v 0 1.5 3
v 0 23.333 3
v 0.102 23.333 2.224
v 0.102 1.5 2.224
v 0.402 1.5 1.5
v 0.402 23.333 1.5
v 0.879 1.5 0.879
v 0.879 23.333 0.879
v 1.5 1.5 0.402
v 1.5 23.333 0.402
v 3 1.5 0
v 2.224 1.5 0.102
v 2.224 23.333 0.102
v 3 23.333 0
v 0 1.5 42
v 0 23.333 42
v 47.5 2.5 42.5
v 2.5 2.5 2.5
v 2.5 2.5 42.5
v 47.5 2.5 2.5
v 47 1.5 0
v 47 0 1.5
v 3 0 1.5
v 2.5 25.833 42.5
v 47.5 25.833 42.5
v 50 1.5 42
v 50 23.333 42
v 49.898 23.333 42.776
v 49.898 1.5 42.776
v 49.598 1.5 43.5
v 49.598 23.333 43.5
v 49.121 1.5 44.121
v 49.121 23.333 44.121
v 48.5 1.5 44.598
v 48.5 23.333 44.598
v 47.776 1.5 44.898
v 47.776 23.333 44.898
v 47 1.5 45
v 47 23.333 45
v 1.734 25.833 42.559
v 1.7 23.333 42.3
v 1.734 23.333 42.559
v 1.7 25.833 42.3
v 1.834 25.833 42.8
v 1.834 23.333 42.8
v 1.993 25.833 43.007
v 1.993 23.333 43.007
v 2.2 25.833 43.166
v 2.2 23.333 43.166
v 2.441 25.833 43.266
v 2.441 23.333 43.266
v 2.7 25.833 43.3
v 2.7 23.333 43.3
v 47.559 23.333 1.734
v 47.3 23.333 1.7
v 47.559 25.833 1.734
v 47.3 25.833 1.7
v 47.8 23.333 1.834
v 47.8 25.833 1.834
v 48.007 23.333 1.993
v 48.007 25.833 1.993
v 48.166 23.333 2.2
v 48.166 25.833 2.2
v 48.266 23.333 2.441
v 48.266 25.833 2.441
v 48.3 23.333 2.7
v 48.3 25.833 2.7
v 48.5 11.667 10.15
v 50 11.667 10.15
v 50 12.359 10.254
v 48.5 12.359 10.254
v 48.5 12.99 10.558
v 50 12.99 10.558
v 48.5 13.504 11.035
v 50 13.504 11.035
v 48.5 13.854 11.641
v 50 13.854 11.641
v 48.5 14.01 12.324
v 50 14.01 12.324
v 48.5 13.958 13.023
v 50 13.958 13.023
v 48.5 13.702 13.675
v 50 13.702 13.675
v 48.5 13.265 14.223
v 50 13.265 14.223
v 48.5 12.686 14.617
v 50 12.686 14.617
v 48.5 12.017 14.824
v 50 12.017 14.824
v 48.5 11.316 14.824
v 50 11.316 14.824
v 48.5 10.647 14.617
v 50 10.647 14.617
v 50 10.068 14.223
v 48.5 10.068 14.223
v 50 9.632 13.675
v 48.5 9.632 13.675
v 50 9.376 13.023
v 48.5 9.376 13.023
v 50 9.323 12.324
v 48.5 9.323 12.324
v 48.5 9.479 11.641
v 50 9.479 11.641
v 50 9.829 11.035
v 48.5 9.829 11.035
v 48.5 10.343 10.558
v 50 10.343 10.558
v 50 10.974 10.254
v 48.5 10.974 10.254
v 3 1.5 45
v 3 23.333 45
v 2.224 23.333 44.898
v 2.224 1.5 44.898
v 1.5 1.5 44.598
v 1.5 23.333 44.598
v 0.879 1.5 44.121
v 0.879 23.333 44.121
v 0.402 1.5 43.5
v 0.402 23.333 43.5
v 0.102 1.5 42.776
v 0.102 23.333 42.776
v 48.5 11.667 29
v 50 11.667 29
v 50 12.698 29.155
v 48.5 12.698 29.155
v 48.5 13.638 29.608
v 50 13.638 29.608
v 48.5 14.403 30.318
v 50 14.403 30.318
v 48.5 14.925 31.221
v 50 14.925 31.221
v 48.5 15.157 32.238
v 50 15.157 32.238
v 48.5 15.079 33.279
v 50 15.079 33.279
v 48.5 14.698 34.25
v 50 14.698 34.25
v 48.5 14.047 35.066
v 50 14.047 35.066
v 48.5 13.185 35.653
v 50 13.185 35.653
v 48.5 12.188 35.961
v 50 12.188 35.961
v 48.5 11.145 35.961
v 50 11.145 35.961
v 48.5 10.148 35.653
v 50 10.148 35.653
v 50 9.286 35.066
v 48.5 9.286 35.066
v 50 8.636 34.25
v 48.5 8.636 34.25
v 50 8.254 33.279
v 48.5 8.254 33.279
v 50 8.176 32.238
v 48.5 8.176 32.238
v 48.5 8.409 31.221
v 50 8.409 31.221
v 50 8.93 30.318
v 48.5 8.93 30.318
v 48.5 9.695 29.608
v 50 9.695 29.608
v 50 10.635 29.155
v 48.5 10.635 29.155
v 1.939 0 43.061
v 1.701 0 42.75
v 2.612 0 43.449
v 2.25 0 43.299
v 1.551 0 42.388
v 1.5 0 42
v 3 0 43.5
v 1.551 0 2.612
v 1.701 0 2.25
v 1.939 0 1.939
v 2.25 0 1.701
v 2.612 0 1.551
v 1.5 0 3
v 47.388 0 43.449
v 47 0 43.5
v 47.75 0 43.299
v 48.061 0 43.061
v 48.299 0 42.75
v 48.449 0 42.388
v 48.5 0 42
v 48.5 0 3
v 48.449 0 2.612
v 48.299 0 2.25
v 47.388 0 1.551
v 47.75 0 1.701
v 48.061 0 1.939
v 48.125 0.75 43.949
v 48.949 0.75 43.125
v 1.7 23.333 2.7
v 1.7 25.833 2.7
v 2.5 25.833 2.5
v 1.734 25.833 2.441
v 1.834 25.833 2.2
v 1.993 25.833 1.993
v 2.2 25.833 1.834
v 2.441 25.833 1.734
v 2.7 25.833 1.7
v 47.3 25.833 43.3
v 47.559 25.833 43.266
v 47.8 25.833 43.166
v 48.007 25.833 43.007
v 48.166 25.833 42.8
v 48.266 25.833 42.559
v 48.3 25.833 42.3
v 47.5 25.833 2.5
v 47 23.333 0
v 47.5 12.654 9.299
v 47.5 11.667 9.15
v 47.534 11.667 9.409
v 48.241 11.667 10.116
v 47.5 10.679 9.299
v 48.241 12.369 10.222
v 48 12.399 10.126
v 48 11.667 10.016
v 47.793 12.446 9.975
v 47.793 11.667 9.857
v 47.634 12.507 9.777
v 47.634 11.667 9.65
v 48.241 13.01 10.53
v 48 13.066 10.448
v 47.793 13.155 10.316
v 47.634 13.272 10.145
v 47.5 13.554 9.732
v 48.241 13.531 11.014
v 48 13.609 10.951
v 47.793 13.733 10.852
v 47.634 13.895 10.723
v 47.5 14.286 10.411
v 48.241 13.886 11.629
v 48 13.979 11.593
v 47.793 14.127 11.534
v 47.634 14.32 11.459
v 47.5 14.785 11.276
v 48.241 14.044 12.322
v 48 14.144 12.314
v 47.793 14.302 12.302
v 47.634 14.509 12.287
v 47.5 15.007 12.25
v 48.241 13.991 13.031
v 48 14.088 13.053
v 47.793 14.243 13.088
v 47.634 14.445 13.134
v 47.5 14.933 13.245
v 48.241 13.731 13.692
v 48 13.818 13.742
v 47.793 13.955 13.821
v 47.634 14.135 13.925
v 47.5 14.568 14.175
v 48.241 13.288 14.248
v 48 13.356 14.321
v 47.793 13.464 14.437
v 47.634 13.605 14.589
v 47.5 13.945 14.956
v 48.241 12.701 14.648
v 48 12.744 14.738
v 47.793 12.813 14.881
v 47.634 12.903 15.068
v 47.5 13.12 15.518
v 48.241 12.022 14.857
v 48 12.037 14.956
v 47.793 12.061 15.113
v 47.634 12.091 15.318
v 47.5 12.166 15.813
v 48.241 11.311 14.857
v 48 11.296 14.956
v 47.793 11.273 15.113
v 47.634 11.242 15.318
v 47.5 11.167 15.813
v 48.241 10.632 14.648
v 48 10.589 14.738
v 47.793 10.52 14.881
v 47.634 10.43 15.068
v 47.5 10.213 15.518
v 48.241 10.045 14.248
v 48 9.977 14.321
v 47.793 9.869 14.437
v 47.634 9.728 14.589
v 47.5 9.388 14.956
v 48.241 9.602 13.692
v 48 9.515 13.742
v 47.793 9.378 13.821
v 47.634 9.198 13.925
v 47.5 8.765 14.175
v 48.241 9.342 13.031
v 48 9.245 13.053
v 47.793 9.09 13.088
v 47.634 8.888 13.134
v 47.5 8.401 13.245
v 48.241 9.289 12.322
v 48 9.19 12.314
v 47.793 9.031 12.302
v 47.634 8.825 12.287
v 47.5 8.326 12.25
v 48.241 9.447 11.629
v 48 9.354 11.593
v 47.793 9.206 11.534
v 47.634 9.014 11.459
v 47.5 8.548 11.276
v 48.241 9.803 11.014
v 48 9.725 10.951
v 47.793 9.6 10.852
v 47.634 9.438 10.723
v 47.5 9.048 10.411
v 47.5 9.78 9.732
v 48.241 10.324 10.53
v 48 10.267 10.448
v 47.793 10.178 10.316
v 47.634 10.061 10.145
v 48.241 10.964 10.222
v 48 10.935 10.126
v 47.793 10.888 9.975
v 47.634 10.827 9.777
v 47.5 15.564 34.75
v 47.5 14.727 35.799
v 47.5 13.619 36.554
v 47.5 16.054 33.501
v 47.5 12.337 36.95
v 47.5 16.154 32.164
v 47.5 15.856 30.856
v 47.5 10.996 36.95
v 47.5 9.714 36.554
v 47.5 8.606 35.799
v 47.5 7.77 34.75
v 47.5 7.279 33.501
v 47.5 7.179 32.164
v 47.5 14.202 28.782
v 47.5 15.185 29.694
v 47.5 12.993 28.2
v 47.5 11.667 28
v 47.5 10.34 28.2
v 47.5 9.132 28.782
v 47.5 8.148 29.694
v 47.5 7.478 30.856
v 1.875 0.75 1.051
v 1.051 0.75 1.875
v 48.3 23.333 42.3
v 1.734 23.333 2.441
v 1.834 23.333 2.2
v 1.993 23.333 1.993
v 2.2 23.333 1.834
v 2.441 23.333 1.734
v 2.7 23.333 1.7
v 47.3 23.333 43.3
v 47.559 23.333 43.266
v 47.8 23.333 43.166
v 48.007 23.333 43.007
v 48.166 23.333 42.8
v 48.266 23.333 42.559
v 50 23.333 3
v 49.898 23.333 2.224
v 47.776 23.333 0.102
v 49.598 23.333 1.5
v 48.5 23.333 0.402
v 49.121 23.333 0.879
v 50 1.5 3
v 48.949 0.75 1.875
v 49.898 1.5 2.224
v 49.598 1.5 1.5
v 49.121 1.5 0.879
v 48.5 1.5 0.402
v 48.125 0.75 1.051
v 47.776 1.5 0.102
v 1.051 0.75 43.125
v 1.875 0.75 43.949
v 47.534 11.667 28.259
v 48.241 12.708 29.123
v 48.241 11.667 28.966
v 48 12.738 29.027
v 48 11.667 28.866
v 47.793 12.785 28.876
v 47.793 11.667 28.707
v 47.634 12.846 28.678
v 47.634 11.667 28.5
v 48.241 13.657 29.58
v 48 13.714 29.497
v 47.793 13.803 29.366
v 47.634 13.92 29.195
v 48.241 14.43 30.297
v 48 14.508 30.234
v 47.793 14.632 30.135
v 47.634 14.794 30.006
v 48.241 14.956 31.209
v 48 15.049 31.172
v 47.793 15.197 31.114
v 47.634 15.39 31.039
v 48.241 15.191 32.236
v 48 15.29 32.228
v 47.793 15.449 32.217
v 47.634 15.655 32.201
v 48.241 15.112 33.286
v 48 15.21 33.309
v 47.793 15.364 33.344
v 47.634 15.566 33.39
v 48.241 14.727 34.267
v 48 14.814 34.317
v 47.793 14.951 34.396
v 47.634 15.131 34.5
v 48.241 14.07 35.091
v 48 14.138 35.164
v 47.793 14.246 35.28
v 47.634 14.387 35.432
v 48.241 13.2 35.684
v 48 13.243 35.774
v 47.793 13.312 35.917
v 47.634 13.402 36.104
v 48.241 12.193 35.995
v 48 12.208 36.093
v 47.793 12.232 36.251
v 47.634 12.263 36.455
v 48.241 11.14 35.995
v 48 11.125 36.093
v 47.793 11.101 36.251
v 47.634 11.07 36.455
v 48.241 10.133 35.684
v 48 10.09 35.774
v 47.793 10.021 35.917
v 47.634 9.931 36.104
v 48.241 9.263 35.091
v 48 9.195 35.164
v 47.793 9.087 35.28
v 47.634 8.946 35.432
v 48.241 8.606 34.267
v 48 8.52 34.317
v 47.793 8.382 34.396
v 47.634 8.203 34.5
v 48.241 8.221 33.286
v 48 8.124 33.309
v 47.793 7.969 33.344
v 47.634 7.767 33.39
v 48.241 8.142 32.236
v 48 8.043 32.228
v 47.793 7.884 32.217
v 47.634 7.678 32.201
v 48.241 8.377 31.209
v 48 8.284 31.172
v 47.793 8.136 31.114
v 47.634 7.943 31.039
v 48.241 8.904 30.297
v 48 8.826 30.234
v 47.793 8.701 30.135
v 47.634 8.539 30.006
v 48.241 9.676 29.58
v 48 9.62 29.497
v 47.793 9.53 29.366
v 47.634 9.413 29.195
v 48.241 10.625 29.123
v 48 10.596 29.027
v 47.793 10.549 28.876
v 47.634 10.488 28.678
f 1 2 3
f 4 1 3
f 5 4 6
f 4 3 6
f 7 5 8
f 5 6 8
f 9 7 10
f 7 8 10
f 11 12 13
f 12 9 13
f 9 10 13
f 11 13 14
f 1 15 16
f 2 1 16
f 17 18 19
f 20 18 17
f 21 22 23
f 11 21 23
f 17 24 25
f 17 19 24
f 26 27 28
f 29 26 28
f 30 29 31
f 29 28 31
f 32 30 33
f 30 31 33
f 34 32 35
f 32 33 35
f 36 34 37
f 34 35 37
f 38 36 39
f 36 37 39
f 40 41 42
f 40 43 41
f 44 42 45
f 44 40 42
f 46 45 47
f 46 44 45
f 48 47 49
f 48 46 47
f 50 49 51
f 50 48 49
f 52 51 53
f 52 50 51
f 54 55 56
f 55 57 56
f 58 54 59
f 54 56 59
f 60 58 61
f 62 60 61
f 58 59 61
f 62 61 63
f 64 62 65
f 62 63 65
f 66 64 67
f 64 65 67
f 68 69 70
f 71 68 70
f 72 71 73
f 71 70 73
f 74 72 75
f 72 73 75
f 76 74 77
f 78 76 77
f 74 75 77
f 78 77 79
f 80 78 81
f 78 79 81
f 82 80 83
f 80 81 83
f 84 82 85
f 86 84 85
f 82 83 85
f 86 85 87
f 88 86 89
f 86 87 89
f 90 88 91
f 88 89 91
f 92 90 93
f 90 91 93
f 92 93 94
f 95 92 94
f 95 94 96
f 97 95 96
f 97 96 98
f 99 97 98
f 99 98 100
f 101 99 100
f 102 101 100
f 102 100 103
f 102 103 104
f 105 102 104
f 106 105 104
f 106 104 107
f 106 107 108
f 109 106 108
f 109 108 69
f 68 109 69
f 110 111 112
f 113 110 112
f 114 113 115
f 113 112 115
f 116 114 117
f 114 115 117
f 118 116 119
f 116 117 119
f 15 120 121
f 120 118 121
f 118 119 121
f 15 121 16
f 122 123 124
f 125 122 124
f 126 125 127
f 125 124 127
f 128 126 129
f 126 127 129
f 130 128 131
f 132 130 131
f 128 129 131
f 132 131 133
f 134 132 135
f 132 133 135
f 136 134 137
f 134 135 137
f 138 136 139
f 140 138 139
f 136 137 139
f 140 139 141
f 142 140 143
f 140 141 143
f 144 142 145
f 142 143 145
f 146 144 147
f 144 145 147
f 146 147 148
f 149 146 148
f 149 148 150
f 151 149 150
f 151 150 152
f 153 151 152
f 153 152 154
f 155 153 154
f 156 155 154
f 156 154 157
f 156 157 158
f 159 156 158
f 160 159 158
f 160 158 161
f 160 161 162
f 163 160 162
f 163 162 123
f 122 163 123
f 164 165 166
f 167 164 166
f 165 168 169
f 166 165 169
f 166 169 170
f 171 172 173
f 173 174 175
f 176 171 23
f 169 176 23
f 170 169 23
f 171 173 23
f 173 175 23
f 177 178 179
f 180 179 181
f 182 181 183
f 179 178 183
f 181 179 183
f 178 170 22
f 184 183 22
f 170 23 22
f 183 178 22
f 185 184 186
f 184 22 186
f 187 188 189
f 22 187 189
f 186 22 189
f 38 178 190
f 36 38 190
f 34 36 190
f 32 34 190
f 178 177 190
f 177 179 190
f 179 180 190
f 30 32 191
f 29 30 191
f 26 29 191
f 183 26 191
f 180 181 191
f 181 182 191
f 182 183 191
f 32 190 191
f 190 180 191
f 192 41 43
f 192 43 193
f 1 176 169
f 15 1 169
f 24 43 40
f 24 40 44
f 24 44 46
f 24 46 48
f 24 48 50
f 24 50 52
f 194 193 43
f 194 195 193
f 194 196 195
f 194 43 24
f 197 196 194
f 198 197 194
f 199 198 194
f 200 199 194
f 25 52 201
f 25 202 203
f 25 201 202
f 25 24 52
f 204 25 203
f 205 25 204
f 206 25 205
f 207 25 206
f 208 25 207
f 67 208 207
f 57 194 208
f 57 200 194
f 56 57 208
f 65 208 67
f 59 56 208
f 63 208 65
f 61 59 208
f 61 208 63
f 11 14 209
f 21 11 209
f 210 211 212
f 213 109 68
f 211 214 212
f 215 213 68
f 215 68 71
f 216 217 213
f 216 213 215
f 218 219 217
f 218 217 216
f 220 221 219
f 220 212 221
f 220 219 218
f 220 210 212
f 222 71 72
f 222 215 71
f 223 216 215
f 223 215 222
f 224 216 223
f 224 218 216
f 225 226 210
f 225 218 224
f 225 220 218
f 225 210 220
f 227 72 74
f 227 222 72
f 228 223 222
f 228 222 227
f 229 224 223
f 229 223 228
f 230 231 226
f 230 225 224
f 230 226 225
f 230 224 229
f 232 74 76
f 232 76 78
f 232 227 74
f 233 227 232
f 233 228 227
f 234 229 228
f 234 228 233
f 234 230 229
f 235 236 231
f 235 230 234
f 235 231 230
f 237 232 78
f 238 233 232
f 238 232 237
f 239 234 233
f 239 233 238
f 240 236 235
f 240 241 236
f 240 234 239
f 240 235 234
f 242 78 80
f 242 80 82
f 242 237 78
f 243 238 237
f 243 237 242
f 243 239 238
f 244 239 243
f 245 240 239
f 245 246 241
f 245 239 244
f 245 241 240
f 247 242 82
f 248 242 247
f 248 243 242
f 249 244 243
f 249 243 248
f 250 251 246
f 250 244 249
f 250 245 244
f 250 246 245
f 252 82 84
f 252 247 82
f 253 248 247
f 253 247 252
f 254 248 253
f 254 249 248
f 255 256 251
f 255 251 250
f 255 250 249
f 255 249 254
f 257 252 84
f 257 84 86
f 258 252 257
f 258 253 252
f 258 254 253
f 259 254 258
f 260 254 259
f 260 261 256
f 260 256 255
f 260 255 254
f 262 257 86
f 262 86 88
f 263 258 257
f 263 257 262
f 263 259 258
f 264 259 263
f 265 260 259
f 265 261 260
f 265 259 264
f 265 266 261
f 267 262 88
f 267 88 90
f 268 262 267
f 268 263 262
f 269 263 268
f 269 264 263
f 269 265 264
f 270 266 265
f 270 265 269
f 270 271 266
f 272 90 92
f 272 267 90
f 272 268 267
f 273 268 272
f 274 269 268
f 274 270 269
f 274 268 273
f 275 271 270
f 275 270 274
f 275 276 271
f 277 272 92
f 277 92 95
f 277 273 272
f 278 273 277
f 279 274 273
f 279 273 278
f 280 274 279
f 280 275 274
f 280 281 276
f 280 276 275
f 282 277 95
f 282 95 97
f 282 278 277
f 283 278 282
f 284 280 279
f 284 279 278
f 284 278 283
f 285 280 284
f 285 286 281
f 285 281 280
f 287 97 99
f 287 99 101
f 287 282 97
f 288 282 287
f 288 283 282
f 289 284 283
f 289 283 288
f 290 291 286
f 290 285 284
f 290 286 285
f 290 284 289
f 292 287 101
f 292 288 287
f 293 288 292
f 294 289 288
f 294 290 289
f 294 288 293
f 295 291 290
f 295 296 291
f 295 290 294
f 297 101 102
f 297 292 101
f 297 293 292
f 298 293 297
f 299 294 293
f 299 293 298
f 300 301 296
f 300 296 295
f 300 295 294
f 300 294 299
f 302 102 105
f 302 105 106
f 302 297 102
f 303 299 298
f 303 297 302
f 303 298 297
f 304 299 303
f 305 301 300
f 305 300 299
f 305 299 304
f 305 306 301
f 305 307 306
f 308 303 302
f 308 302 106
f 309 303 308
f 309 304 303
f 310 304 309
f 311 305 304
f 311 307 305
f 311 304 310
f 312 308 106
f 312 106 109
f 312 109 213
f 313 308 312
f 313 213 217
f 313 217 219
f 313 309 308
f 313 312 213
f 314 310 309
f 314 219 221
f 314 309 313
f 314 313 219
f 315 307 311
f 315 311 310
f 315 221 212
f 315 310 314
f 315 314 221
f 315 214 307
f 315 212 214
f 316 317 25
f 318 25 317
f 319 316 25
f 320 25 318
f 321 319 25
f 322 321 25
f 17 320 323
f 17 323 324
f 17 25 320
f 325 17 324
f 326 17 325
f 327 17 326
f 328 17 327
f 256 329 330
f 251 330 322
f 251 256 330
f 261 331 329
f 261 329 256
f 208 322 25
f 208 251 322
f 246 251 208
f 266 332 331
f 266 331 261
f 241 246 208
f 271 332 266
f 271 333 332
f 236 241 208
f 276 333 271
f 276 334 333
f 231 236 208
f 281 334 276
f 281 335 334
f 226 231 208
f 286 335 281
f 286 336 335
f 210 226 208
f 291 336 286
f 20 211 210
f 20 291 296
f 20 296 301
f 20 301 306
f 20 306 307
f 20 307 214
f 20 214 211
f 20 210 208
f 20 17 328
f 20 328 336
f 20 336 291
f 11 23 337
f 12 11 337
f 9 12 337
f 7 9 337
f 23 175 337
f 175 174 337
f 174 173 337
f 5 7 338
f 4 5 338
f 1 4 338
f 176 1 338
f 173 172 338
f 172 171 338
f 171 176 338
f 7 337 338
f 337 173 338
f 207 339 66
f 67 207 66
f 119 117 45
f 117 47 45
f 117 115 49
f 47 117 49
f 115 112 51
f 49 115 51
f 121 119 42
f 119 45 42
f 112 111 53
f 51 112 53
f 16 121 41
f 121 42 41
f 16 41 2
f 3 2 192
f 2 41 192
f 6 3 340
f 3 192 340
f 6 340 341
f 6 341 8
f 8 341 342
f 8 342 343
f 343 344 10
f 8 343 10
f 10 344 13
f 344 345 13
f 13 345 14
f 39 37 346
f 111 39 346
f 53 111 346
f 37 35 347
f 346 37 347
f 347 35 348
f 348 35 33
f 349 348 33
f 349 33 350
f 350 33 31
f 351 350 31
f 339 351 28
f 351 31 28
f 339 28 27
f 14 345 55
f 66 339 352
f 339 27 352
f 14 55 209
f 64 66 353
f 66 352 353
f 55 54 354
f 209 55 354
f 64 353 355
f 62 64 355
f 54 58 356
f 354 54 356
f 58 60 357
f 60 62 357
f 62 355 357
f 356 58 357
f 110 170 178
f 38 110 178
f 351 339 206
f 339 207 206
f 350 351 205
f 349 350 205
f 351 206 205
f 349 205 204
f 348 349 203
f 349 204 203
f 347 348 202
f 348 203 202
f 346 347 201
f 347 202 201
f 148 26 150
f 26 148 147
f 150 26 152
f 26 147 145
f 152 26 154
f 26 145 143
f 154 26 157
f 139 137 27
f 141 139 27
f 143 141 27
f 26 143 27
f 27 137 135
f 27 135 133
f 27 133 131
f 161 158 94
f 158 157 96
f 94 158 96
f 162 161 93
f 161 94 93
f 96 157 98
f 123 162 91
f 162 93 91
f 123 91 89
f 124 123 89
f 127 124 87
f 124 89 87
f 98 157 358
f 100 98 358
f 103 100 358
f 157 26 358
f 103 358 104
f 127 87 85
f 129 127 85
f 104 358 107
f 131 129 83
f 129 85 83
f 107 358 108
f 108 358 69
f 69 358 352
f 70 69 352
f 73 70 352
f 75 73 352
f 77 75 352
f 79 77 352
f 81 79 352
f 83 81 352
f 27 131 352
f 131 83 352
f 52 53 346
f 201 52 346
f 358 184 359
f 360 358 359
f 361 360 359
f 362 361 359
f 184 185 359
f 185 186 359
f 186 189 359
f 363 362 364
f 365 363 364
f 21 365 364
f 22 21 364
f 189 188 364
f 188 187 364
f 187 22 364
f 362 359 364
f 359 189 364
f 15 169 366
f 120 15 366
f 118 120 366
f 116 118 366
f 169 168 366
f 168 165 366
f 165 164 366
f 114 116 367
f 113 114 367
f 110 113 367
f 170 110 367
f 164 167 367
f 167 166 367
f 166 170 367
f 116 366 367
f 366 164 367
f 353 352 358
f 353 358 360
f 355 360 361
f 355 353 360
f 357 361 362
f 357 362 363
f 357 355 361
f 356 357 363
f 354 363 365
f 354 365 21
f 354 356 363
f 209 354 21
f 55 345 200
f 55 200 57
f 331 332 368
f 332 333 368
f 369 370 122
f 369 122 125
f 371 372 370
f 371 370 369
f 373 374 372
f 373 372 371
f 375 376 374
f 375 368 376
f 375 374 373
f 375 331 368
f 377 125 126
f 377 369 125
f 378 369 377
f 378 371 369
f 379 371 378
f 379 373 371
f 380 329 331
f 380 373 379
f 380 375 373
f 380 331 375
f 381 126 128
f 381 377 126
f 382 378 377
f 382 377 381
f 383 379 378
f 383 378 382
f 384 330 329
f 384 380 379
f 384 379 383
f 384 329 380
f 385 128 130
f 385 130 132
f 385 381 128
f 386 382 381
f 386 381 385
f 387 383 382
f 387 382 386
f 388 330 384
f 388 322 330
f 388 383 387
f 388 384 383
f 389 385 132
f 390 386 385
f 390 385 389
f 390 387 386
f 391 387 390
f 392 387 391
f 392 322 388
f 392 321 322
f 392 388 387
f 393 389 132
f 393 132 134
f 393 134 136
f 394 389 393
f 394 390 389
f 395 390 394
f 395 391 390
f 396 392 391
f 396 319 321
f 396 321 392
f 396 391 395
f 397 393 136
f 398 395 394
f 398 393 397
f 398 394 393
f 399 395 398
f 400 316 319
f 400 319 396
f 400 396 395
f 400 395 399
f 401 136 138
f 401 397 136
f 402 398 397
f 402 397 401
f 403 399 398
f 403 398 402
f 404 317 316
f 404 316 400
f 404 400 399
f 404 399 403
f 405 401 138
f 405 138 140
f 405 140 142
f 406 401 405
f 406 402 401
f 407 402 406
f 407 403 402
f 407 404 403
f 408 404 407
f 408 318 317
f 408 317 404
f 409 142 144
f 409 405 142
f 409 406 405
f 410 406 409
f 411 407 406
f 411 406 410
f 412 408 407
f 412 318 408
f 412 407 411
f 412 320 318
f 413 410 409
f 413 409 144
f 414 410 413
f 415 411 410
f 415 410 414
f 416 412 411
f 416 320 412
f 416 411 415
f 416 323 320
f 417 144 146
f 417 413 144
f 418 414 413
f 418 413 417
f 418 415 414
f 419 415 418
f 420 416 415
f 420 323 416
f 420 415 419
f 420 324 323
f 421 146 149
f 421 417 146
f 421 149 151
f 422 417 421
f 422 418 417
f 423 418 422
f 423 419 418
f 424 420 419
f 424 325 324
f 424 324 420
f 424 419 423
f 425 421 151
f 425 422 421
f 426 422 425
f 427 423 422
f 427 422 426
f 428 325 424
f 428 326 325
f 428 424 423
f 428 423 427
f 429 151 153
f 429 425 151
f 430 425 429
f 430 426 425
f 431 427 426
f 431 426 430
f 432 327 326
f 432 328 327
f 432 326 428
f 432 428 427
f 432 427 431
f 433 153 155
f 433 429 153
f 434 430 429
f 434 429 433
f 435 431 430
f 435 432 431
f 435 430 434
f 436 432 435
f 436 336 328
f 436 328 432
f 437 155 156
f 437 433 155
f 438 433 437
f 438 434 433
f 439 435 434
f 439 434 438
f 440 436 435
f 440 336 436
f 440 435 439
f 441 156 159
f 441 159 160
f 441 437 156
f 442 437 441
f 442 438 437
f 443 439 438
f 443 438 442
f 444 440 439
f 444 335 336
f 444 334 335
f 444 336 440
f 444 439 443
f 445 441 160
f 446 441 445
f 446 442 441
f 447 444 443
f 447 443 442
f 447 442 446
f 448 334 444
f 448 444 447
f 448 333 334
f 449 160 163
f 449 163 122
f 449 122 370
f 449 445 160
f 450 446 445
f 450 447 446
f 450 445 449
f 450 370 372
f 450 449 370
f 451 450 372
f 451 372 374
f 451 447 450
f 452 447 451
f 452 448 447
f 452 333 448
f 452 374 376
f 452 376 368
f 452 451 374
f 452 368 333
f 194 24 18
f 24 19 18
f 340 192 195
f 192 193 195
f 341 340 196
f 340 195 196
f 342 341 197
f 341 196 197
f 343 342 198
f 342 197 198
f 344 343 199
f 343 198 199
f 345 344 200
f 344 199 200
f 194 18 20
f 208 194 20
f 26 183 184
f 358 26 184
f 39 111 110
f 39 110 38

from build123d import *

# Parameters (mm, degrees)
SKETCH1_W           = 50
SKETCH1_H           = 35
BOSS_EXTRUDE1_DEPTH = 45
SKETCH3_W           = 45
SKETCH3_H           = 11.666666667
CUT_EXTRUDE2_DEPTH  = 76.828754441
SHELL1_T            = -2.5
SKETCH2_R           = 3.5
SKETCH2_R_2         = 2.35
CUT_EXTRUDE1_DEPTH  = 4
SKETCH4_W           = 46.6
SKETCH4_H           = 41.6
SKETCH4_W_2         = 45
SKETCH4_H_2         = 40
BOSS_EXTRUDE2_DEPTH = 2.5
FILLET1_R           = 3
FILLET2_R           = 1
CHAMFER1_SIZE       = 1.5
FILLET3_R           = 1


with BuildPart() as part:
    # Sketch1 → Boss-Extrude1 (new body)
    with BuildSketch(Plane.XY):
        with Locations((25, 17.5)):
            Rectangle(SKETCH1_W, SKETCH1_H)
    extrude(amount=BOSS_EXTRUDE1_DEPTH)

    # Sketch3 → Cut-Extrude2 (cut, through all)
    with BuildSketch(Plane(origin=(50, 0, 0), x_dir=(0, 0, -1), z_dir=(1, 0, 0))):
        with Locations((-22.5, 29.166666666)):
            Rectangle(SKETCH3_W, SKETCH3_H)
    extrude(amount=-CUT_EXTRUDE2_DEPTH, mode=Mode.SUBTRACT)

    # Shell1
    shell1_openings = [part.faces().sort_by_distance(p)[0] for p in [
        (25, 23.333333333, 22.5),
    ]]
    offset(amount=SHELL1_T, openings=shell1_openings, kind=Kind.INTERSECTION)

    # Sketch2 → Cut-Extrude1 (cut)
    with BuildSketch(Plane(origin=(50, 0, 0), x_dir=(0, 0, -1), z_dir=(1, 0, 0))):
        with Locations((-32.5, 11.666666667)):
            Circle(SKETCH2_R)
        with Locations((-12.5, 11.666666667)):
            Circle(SKETCH2_R_2)
    extrude(amount=-CUT_EXTRUDE1_DEPTH, mode=Mode.SUBTRACT)

    # Sketch4 → Boss-Extrude2 (add)
    with BuildSketch(Plane(origin=(0, 23.333333333, 0), x_dir=(1, 0, 0), z_dir=(0, 1, 0))):
        with Locations((25, -22.5)):
            Rectangle(SKETCH4_W, SKETCH4_H)
        with Locations((25, -22.5)):
            Rectangle(SKETCH4_W_2, SKETCH4_H_2, mode=Mode.SUBTRACT)
    extrude(amount=BOSS_EXTRUDE2_DEPTH)

    # Fillet1
    fillet1_edges = [part.edges().sort_by_distance(p)[0] for p in [
        (50, 11.666666667, 45),
        (0, 11.666666667, 0),
        (0, 11.666666667, 45),
        (50, 11.666666667, 0),
    ]]
    fillet(fillet1_edges, radius=FILLET1_R)

    # Fillet2
    fillet2_edges = [part.edges().sort_by_distance(p)[0] for p in [
        (1.7, 24.583333333, 1.7),
        (1.7, 24.583333333, 43.3),
        (48.3, 24.583333333, 43.3),
        (48.3, 24.583333333, 1.7),
    ]]
    fillet(fillet2_edges, radius=FILLET2_R)

    # Chamfer1
    chamfer1_edges = [part.edges().sort_by_distance(p)[0] for p in [
        (49.121320344, 0, 0.878679656),
        (0.878679656, 0, 0.878679656),
        (0, 0, 22.5),
        (25, 0, 0),
        (50, 0, 22.5),
        (25, 0, 45),
        (0.878679656, 0, 44.121320344),
        (49.121320344, 0, 44.121320344),
    ]]
    chamfer(chamfer1_edges, length=CHAMFER1_SIZE)

    # Fillet3
    fillet3_edges = [part.edges().sort_by_distance(p)[0] for p in [
        (47.5, 11.666666667, 36),
        (47.5, 11.666666667, 14.85),
    ]]
    fillet(fillet3_edges, radius=FILLET3_R)


solid = part.part
